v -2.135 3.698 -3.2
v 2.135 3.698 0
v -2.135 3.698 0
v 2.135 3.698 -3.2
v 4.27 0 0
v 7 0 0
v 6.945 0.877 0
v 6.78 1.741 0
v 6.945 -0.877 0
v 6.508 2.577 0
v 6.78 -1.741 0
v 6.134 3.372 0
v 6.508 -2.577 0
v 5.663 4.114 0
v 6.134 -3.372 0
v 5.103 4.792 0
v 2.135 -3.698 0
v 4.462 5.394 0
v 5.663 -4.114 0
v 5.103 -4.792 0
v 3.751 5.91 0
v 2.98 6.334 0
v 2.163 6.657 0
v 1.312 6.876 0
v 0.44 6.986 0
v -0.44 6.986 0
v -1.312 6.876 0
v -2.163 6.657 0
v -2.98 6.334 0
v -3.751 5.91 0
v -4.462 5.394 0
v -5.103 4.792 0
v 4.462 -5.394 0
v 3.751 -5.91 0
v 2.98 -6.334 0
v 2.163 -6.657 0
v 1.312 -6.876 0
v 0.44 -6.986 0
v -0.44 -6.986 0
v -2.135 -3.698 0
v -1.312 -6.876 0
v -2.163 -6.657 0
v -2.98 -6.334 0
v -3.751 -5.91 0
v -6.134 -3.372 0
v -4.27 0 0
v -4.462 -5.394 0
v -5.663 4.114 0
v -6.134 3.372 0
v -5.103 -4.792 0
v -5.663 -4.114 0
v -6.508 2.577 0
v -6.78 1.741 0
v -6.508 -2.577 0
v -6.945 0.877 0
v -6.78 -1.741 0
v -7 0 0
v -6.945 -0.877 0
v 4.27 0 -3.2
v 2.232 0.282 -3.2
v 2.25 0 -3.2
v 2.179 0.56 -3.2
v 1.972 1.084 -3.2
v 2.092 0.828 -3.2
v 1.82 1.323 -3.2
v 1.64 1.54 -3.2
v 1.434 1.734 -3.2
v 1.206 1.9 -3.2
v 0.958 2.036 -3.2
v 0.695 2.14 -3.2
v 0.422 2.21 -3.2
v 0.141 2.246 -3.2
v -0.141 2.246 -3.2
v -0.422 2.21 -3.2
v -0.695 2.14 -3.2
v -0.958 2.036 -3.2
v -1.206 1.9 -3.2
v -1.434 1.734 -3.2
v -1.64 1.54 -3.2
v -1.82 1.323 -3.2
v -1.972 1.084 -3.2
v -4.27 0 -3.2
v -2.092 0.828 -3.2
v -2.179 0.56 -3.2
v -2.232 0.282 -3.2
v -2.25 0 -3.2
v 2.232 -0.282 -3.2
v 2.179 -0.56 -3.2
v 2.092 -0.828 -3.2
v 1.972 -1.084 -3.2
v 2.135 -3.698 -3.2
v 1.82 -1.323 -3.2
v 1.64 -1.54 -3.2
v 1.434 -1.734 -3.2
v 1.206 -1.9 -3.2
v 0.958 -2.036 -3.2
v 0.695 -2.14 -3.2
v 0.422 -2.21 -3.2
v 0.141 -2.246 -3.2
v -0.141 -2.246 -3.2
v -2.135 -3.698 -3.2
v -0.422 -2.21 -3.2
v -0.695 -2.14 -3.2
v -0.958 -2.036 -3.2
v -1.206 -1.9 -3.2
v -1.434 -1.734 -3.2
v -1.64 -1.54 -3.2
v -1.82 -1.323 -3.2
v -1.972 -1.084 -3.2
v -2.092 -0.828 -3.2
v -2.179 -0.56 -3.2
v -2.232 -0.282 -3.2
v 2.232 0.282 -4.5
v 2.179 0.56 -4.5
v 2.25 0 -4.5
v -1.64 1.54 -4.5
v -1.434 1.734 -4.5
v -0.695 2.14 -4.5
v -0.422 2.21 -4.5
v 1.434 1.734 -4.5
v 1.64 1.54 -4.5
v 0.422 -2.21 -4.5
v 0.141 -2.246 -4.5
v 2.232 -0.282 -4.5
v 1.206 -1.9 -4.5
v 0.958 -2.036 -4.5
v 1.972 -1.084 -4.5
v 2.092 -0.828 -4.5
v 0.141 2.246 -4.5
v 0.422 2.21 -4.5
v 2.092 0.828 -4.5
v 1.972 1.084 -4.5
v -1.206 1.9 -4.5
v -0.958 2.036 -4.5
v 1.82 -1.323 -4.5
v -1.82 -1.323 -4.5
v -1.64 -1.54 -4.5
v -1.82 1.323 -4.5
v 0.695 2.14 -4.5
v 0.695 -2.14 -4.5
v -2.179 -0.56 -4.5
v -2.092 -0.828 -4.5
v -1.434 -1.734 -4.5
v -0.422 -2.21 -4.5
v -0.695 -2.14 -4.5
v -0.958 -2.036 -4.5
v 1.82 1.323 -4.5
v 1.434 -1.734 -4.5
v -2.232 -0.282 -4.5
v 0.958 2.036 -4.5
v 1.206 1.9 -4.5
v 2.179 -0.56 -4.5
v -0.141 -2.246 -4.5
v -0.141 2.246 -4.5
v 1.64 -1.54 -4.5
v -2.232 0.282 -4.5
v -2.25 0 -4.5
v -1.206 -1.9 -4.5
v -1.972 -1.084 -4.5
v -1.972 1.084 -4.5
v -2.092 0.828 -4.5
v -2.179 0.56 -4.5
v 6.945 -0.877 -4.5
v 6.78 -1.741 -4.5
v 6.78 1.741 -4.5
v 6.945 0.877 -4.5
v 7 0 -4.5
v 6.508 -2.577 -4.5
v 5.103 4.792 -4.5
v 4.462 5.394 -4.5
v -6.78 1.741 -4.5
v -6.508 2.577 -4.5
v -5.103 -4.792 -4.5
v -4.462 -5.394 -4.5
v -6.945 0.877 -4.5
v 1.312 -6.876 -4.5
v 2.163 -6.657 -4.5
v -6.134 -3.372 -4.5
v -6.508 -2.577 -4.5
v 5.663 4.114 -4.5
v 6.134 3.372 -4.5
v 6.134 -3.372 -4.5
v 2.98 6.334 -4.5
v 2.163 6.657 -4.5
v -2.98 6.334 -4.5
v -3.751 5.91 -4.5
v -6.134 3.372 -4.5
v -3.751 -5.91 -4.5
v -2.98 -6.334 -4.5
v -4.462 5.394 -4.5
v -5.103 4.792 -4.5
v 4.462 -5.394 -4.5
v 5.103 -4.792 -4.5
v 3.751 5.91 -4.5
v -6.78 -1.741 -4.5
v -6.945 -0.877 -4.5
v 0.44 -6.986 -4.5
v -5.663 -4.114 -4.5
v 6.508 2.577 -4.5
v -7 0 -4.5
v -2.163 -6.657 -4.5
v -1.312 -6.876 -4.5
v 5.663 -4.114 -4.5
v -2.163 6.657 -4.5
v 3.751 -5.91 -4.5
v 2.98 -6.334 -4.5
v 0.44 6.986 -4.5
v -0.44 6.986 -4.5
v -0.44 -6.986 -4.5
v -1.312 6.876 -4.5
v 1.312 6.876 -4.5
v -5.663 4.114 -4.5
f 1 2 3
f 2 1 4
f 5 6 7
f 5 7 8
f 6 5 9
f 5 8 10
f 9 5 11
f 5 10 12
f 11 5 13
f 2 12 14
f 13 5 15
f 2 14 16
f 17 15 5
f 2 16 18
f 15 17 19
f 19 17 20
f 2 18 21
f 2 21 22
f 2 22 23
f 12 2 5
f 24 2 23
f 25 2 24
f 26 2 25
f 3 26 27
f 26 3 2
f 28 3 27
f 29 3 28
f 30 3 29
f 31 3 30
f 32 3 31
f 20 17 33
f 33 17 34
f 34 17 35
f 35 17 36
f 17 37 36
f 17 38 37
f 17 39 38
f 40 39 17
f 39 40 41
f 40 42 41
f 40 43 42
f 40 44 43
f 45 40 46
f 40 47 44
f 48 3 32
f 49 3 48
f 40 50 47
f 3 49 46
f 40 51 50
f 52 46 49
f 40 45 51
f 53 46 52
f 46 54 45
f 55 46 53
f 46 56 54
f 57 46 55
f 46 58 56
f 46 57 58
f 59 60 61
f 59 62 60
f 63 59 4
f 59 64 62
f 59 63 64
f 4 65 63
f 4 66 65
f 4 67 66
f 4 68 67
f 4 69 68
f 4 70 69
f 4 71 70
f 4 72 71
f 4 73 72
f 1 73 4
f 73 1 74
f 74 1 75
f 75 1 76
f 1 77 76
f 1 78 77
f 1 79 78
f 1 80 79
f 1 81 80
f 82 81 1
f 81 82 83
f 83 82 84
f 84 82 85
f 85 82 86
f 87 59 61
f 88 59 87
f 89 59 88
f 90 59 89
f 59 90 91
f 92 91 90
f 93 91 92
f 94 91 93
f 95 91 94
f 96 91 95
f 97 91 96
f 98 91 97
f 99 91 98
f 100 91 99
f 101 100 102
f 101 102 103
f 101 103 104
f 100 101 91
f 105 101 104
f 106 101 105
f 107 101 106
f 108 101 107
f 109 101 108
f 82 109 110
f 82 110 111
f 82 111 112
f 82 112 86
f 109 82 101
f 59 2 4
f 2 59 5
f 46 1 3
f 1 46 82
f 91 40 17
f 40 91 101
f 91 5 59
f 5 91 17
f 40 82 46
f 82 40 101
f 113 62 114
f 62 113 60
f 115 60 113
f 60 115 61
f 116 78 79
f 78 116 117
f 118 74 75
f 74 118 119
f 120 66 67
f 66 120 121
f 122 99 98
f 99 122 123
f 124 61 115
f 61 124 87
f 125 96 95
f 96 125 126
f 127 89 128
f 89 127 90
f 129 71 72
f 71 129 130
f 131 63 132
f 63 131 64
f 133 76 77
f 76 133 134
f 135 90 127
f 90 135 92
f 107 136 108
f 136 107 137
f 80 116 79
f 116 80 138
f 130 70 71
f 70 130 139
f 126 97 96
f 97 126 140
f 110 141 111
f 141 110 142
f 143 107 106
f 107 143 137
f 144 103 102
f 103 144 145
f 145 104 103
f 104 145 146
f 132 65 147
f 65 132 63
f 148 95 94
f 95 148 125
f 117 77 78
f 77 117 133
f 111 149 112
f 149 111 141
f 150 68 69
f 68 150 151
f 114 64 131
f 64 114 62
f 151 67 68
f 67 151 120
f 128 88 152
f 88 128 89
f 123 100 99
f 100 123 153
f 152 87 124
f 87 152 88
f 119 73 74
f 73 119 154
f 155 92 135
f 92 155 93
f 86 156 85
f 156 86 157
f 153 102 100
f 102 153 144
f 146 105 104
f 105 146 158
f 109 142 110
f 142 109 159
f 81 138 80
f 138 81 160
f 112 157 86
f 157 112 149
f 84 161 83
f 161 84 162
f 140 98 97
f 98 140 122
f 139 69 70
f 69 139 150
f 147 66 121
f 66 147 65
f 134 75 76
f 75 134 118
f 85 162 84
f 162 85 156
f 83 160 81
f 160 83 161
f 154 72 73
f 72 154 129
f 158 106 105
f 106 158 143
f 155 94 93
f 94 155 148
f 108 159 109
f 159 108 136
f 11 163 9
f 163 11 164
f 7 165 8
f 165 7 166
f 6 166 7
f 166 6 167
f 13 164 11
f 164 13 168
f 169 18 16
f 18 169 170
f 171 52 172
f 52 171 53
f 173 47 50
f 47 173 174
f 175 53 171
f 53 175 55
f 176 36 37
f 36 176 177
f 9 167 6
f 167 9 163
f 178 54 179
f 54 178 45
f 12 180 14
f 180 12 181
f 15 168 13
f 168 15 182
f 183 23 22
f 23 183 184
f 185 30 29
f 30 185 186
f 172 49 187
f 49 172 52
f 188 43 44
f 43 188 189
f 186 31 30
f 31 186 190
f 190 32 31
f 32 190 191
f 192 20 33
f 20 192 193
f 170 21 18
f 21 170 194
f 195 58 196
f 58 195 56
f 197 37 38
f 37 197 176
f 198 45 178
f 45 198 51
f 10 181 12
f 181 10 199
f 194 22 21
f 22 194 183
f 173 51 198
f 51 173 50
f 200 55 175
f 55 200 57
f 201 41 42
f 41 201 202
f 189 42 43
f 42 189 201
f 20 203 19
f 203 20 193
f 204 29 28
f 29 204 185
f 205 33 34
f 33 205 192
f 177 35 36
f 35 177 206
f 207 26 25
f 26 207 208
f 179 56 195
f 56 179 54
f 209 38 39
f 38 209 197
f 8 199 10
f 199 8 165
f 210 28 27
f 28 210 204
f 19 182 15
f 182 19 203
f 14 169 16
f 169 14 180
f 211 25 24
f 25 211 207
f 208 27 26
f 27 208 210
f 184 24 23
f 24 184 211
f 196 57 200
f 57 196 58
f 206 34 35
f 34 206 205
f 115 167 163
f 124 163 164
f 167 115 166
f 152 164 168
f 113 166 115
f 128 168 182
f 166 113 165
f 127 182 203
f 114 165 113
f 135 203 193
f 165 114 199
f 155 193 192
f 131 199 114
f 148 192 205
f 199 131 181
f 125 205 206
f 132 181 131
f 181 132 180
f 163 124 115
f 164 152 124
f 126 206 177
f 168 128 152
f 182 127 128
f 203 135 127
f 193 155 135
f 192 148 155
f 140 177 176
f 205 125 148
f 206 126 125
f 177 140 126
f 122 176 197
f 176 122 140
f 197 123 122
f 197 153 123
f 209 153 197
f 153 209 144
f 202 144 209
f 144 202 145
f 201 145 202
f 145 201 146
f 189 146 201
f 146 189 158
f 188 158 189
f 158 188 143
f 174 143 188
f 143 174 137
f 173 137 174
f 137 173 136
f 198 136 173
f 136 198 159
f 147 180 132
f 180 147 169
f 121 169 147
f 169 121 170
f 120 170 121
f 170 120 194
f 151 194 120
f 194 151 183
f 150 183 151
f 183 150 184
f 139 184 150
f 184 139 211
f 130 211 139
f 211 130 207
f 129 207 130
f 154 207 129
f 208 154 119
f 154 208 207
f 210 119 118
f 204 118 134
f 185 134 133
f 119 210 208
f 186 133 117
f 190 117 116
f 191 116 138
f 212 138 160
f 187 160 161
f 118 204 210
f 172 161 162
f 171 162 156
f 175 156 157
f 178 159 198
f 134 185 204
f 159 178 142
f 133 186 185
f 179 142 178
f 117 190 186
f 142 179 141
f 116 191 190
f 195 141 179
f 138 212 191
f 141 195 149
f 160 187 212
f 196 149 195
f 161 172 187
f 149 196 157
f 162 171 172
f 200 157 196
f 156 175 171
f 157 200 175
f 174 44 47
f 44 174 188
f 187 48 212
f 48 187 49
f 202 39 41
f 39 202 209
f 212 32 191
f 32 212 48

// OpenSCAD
$fn = 50;

difference() {
	union() {
		translate(v = [0, 0, -4.5]) {
			cylinder(h = 4.5, r = 7.0);
		}
	}
	union() {
		translate(v = [0, 0, 0]) {
			rotate(a = [0, 0, 0]) {
				difference() {
					union() {
						translate(v = [0, 0, -3.2]) {
							linear_extrude(height = 3.2) {
								polygon(points = [[4.2698, 0.0], [2.1349000000000005, 3.697755269078796], [-2.134899999999999, 3.6977552690787965], [-4.2698, 5.228996902999369e-16], [-2.134900000000002, -3.6977552690787956], [2.1348999999999974, -3.697755269078798]]);
							}
						}
					}
					union();
				}
			}
		}
		#translate(v = [0, 0, -100.0]) {
			cylinder(h = 200, r = 2.25);
		}
	}
}
